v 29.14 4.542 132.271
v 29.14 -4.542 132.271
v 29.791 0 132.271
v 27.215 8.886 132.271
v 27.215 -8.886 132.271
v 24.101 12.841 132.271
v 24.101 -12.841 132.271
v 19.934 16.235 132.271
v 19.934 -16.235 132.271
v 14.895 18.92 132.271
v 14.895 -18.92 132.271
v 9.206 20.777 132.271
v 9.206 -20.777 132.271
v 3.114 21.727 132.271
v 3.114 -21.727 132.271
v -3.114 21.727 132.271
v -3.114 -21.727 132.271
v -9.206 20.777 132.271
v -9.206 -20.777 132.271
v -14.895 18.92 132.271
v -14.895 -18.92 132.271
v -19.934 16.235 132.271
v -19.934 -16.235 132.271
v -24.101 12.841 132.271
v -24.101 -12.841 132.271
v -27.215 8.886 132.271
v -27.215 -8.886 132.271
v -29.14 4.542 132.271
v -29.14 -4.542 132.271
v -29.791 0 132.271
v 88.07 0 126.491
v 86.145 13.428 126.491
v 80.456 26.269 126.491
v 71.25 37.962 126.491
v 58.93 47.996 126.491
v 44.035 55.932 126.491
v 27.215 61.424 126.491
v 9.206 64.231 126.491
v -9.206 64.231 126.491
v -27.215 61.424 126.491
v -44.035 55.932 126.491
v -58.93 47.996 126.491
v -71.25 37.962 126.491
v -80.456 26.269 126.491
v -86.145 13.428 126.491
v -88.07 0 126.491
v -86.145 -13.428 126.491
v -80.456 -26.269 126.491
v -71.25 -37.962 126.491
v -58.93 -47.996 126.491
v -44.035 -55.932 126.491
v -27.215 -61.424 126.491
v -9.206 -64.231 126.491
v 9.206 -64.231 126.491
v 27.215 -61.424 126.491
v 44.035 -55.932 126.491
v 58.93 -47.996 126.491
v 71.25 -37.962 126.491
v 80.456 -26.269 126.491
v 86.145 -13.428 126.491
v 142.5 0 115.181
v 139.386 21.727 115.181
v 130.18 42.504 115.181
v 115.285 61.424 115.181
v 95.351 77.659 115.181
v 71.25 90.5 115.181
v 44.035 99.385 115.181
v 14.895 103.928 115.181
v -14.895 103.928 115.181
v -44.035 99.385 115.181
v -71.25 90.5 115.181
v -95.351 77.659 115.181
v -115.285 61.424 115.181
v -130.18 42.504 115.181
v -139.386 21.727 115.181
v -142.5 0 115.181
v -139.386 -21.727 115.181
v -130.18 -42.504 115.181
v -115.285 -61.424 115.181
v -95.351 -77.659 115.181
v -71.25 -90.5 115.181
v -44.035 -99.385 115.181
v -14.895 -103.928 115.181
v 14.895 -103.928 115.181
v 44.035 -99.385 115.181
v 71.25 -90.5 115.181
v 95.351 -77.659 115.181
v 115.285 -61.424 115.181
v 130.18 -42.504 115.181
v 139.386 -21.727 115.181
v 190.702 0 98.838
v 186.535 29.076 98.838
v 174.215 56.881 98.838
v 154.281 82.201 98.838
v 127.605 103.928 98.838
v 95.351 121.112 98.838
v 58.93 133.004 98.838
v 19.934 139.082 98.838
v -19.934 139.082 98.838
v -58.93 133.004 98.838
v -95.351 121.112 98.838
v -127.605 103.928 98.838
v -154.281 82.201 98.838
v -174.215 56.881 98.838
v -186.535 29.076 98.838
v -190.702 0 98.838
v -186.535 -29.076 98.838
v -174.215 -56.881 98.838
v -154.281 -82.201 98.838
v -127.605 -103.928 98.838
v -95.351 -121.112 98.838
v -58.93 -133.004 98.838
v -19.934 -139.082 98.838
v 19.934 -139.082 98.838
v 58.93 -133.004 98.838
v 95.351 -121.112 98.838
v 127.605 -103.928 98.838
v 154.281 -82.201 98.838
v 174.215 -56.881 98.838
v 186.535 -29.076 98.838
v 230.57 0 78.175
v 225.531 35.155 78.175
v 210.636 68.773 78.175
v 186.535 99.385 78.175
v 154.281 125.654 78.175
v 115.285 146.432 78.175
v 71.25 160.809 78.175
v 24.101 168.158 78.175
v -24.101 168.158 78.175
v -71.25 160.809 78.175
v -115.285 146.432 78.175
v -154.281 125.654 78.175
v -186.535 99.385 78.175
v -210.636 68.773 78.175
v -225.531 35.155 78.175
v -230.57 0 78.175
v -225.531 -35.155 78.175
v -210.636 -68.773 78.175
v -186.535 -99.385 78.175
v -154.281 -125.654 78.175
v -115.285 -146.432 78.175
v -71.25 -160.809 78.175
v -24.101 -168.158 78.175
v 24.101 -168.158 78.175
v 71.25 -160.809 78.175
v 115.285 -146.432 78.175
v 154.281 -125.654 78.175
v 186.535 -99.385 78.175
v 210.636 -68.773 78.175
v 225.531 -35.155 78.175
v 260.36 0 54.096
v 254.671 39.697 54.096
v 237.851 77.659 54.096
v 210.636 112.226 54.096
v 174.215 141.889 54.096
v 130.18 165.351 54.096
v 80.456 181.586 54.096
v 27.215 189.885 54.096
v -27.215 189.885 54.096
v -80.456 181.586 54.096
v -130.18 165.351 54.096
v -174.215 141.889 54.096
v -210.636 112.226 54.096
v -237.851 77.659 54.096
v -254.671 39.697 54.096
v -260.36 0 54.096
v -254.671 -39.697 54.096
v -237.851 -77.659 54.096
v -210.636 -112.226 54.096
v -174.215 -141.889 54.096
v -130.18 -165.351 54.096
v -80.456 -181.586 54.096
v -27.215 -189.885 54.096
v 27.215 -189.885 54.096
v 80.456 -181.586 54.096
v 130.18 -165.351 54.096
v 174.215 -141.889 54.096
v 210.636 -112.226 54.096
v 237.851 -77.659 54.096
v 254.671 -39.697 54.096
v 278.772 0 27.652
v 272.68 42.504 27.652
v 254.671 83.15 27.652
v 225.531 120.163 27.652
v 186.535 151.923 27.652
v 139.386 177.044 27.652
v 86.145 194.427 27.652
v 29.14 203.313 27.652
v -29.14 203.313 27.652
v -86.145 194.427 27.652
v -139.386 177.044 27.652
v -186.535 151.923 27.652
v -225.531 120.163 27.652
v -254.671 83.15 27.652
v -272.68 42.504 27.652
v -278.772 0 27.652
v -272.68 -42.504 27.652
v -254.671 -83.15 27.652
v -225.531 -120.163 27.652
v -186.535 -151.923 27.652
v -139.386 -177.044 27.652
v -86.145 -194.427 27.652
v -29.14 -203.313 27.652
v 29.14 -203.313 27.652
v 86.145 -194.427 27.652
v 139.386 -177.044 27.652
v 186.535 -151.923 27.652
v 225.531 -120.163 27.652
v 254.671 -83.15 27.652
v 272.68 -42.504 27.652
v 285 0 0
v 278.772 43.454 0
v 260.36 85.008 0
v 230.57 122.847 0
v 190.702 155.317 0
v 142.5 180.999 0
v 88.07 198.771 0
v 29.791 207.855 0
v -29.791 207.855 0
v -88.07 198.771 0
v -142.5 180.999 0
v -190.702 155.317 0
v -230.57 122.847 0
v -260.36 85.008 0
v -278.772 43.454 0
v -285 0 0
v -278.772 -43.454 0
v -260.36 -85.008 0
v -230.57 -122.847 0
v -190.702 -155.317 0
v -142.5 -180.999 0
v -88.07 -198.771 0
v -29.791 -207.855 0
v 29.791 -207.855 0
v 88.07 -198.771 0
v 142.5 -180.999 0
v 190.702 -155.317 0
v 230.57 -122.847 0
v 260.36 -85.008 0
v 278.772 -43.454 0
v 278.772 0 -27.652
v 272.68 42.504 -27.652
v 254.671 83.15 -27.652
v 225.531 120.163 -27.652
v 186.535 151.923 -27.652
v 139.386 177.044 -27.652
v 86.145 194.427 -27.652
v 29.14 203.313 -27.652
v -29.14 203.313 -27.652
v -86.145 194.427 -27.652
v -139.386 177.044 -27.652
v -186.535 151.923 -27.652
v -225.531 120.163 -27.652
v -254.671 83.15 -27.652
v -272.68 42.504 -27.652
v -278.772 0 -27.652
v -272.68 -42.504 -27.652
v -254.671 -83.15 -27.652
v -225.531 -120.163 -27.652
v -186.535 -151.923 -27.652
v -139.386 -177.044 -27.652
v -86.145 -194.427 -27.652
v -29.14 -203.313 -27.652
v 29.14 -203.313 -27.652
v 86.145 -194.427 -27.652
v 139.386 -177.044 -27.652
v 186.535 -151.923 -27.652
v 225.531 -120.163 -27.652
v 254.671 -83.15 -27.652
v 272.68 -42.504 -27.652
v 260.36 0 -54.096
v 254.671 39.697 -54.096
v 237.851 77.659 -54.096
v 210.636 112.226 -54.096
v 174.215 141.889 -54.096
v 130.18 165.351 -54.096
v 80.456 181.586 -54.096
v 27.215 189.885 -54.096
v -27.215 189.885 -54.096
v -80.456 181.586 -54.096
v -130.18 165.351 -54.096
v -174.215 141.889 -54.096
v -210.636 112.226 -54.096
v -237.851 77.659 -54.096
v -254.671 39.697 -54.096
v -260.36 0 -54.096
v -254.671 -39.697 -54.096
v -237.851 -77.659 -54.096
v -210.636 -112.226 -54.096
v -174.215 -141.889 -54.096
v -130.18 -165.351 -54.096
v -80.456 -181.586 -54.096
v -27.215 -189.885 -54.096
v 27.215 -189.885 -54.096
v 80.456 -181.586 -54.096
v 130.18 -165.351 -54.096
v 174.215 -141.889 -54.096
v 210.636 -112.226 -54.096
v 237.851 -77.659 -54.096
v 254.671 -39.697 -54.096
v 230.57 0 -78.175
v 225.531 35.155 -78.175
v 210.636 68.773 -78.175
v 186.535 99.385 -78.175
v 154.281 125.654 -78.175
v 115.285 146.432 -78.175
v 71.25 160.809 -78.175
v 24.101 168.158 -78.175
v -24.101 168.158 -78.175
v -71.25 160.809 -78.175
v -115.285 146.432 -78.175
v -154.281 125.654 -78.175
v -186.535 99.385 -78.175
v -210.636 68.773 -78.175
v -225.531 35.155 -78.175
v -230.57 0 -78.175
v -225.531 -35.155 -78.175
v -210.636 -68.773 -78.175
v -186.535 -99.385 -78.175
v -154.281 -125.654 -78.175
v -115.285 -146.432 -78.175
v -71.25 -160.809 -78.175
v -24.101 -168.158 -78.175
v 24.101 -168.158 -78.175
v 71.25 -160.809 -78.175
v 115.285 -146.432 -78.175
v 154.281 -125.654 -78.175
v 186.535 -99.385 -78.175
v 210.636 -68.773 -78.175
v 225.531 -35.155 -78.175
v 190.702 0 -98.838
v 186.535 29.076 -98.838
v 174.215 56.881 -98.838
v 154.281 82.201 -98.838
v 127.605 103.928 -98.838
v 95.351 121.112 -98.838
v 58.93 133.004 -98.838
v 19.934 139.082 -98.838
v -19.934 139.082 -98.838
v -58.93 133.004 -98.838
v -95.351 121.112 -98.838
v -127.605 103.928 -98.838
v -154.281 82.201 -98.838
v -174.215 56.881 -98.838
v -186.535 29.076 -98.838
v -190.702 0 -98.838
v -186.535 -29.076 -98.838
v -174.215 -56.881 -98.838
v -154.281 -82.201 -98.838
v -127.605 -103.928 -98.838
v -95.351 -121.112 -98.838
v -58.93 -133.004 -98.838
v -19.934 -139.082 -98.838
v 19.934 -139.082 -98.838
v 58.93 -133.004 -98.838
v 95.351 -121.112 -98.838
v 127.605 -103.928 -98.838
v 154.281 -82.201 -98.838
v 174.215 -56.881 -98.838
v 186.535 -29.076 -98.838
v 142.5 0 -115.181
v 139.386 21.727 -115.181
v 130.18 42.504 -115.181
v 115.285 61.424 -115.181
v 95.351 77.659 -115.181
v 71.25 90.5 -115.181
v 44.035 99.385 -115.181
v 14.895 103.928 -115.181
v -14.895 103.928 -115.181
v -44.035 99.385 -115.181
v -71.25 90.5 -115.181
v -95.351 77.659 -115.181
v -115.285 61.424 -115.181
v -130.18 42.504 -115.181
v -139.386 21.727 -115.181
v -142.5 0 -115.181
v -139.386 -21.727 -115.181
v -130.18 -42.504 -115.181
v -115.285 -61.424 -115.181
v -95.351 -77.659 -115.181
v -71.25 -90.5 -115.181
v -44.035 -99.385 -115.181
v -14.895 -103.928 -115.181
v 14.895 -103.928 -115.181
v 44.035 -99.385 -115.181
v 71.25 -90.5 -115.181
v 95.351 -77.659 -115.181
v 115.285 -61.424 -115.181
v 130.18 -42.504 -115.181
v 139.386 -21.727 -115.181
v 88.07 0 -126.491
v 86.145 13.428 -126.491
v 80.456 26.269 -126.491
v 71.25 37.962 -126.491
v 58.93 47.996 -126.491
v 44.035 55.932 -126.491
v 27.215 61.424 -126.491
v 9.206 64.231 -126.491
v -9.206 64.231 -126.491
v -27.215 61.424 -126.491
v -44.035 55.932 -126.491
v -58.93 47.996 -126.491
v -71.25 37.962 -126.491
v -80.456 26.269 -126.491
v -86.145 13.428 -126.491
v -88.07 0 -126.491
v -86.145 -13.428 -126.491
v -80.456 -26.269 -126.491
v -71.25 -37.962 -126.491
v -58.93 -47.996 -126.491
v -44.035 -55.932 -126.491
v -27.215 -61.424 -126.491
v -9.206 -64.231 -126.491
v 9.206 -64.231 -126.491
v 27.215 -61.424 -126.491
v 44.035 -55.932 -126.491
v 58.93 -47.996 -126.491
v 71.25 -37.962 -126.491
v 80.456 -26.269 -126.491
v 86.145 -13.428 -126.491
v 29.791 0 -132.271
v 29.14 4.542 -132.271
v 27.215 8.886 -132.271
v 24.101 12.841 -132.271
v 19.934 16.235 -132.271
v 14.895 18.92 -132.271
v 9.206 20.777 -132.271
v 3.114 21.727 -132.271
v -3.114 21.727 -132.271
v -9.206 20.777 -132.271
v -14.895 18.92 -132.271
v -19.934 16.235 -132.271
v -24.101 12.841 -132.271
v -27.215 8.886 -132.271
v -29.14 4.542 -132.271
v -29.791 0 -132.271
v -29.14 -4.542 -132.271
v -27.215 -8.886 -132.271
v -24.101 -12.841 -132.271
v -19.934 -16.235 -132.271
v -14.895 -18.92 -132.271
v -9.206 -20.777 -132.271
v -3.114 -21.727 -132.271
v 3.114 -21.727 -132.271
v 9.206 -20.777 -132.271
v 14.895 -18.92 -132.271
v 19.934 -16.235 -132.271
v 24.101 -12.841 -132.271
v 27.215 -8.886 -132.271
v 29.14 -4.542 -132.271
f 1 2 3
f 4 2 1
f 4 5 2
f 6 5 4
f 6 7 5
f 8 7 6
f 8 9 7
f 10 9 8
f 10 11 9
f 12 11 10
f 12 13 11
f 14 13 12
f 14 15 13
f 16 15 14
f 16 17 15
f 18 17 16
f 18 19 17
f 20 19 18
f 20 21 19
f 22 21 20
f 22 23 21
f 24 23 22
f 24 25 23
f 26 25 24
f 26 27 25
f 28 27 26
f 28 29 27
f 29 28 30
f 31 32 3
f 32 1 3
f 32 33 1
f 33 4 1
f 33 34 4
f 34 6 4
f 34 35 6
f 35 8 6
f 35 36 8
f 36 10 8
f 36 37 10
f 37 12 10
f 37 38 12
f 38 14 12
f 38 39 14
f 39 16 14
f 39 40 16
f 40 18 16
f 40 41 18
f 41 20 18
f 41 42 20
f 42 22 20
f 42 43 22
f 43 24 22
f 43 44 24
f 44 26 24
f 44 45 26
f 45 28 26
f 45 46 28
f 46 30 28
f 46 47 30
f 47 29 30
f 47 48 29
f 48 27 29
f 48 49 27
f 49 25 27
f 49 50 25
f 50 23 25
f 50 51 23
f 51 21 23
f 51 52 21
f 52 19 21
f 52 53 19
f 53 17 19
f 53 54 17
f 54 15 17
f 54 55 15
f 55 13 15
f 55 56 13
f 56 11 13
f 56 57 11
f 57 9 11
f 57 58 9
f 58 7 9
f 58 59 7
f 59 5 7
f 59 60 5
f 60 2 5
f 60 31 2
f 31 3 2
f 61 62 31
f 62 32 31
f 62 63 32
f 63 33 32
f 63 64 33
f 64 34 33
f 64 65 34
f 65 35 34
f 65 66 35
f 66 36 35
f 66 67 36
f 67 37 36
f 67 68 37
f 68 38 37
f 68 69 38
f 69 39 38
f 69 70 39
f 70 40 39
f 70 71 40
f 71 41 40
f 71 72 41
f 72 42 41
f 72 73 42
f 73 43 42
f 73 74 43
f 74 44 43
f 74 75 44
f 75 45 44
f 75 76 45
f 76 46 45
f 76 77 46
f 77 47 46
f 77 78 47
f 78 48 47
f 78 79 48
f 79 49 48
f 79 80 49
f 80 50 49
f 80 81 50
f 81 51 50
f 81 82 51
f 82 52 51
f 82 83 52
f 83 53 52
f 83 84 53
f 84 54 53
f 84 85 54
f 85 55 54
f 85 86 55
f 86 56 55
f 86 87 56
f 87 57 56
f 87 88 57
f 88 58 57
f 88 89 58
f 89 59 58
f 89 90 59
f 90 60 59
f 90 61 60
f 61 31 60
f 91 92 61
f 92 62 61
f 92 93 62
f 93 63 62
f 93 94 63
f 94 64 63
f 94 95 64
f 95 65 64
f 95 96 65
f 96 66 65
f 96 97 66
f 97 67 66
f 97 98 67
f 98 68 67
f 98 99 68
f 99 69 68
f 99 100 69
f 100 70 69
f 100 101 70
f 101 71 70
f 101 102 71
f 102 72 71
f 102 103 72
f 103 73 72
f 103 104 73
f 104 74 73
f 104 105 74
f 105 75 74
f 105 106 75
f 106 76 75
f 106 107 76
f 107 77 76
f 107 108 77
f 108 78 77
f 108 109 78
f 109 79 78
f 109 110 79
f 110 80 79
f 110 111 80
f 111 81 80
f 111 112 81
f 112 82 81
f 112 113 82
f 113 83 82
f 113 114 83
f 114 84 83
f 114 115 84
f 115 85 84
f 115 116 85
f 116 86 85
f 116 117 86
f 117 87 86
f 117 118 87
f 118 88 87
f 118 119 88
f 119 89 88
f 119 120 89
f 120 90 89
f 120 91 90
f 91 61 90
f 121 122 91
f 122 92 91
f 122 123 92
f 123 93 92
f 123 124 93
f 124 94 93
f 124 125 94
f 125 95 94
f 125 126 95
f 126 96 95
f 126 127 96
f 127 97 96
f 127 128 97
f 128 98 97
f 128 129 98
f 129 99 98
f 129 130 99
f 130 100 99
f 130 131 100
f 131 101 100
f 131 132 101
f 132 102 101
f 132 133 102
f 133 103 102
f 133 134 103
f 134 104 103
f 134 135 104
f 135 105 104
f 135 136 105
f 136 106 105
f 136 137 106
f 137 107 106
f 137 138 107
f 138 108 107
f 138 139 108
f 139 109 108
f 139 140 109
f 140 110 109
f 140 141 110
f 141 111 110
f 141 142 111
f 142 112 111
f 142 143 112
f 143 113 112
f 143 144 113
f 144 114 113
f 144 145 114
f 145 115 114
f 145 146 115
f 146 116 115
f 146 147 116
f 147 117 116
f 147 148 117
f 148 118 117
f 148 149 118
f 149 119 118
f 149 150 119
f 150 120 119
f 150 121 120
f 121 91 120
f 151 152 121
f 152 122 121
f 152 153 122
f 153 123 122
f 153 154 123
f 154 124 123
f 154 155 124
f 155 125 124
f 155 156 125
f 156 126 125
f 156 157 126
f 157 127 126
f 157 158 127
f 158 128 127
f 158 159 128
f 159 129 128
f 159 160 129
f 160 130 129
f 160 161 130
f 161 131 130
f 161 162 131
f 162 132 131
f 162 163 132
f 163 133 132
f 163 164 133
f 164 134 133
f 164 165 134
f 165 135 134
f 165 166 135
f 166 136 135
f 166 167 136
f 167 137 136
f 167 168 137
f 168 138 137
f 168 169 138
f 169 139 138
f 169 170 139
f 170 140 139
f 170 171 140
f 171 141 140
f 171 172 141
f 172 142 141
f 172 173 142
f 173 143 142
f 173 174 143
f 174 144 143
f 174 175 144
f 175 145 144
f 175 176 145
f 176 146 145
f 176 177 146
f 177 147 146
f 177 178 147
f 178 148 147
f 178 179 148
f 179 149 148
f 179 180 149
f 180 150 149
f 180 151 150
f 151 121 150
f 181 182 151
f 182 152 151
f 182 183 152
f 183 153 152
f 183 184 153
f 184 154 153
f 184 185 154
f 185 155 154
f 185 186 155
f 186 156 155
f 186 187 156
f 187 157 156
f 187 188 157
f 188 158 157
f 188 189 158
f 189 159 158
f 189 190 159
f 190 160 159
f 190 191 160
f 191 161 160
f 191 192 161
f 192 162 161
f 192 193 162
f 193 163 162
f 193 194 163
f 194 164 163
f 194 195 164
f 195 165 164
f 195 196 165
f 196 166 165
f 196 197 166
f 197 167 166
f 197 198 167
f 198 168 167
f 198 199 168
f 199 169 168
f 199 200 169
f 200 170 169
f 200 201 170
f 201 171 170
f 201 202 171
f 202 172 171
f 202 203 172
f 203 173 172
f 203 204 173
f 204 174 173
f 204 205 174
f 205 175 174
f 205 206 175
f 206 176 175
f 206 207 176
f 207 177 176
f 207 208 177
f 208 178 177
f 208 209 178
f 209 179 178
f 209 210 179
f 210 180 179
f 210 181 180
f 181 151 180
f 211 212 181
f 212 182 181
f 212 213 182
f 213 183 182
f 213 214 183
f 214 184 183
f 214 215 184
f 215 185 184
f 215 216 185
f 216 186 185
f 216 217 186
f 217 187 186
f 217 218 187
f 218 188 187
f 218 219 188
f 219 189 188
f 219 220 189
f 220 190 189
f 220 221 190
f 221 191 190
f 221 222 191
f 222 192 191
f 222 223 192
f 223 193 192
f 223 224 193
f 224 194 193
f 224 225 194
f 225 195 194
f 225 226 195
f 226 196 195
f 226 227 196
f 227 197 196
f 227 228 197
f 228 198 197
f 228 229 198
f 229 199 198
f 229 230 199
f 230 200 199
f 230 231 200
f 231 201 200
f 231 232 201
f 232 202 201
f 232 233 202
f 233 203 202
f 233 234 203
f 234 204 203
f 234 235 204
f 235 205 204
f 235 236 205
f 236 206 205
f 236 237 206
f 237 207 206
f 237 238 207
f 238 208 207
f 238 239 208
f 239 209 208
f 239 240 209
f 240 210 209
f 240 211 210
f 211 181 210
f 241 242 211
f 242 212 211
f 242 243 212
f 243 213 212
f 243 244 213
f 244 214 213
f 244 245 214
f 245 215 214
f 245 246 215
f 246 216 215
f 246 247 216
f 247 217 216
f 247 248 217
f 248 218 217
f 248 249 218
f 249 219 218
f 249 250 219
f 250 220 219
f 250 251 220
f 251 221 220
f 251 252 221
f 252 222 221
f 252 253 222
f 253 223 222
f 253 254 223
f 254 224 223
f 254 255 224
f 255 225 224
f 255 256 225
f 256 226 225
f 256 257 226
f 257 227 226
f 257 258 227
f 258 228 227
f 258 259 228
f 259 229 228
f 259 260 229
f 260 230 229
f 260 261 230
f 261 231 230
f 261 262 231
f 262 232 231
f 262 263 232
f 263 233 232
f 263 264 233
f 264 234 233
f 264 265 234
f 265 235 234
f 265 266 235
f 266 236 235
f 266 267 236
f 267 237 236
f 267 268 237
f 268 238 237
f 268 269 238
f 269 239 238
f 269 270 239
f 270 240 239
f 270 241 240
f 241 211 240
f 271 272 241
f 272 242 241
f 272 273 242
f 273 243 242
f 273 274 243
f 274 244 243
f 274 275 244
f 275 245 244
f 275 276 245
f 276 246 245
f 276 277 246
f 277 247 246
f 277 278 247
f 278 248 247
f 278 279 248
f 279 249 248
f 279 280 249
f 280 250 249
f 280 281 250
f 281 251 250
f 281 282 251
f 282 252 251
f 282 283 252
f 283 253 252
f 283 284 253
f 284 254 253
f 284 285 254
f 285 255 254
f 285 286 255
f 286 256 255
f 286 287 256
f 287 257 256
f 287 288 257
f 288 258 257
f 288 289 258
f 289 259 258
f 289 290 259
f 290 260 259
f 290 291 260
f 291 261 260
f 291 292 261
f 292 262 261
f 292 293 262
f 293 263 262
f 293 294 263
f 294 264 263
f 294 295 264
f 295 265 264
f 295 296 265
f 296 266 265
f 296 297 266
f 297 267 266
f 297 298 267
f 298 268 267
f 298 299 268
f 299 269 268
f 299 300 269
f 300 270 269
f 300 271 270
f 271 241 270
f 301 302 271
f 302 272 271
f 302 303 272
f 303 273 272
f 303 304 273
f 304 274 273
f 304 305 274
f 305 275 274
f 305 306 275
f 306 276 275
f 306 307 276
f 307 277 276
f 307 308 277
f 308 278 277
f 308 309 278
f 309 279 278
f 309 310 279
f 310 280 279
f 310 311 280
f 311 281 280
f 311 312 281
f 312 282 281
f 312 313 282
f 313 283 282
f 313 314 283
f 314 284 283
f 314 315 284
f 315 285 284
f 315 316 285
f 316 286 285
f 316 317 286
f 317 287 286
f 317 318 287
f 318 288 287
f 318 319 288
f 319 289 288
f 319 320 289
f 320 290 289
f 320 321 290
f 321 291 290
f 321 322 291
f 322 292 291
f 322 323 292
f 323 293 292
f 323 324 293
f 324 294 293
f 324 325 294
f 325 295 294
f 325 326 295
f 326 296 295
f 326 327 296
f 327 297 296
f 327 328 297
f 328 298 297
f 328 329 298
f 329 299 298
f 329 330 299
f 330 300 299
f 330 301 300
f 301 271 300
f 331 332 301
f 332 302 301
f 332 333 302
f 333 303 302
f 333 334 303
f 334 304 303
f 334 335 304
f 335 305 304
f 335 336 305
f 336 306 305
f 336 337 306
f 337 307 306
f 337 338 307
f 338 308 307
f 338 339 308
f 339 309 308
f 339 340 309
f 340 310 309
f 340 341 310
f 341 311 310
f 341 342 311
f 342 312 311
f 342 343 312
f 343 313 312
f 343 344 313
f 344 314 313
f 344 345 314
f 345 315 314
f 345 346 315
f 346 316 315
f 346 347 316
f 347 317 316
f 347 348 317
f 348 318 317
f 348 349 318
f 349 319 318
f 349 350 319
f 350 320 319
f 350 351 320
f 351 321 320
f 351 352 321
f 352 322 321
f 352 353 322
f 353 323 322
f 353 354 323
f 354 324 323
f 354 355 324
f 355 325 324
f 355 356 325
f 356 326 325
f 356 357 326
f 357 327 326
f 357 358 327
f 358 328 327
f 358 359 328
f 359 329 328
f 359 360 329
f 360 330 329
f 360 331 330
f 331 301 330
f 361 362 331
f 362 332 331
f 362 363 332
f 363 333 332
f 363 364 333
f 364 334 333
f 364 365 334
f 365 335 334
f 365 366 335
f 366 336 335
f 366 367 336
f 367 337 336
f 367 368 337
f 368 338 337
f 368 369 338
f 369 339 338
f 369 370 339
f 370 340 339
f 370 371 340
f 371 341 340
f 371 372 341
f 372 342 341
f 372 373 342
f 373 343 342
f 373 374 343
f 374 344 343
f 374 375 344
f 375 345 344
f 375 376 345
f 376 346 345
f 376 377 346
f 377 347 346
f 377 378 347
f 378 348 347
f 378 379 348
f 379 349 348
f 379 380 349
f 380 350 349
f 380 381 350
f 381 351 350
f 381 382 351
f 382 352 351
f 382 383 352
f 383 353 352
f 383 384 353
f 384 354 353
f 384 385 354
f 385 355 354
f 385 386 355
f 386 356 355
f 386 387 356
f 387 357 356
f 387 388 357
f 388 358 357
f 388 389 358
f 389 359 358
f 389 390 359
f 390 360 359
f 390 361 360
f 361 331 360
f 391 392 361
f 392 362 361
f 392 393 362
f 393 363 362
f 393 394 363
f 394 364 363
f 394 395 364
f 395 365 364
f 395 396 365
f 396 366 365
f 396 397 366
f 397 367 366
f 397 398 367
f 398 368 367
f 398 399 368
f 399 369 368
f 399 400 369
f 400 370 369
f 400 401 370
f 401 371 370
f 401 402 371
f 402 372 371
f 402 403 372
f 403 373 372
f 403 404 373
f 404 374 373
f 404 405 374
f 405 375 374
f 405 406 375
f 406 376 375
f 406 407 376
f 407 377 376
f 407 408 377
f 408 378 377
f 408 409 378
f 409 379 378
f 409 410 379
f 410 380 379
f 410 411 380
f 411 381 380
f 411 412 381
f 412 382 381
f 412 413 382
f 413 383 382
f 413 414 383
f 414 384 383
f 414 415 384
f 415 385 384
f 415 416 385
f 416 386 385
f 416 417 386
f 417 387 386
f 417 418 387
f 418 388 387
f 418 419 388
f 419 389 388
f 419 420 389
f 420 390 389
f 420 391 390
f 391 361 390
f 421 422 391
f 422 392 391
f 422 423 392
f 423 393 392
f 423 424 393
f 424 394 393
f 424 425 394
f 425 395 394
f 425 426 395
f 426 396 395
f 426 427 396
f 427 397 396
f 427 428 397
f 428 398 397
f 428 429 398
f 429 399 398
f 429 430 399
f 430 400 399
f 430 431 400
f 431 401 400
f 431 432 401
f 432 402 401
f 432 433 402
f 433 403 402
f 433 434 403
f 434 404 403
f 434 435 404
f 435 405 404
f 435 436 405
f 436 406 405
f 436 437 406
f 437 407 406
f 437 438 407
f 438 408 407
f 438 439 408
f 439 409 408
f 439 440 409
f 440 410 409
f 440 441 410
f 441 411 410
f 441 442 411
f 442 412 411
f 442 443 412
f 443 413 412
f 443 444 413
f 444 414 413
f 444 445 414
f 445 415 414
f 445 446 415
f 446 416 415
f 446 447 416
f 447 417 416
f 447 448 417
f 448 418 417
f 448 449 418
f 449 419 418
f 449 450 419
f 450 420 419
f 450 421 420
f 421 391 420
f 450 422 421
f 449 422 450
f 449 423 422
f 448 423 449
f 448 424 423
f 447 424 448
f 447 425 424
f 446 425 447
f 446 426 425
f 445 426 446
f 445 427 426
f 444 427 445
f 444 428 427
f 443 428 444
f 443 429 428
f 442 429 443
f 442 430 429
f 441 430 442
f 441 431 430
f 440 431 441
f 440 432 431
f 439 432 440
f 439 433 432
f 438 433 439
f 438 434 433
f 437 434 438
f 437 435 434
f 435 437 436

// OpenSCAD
// Generated by SolidPython 1.0.1 on 2020-07-29 00:46:52


scale(v = [15, 11, 7]) {
	sphere(r = 19);
}
/***********************************************
*********      SolidPython code:      **********
************************************************
 
# import packages: SolidPython
from solid import *
from solid.utils import *
from itertools import chain, combinations, permutations


class Resize:

    def __init__(self, scad_file):
        self.scad_file = scad_file
        #self.scad_file = import_scad(scad_file)
        # cone/cylinder param:
        self.r1 = 0
        self.r2 = 0
        self.h = 0
        # rectangular prism param:
        self.w = 0
        self.l = 0
        # ellipse param:
        self.r = 0

    # import OpenScad code (file name corresponds to shape)


    # classify shape + parameters
    def assign(self, param1, param2, param3):
        if self.scad_file == 'cone.scad':
            self.r1 = param1
            self.r2 = param2
            self.h = param3
        elif self.scad_file == 'cylinder.scad':
            self.r1 = param1
            self.r2 = param2
            self.h = param3
        elif self.scad_file == 'rectangularPrism.scad':
            self.h = param1
            self.l = param2
            self.w = param3
        else:
            self.r = param1
            self.h = param2

    # resize parameters
    def iterate(self):
        x = range(3, 20, 2)
        i = 1
        if self.scad_file == 'cone.scad':
            tempList = list(permutations(x, 2))
            for temp in tempList:
                param1 = temp[0]
                param2 = temp[1]
                filepath = 'produced_scad_files/' + 'cone' + str(param1) + '_' + str(param2) + '_' + '.scad'
                scad_render_to_file(cylinder(h=param1, r1=param2, r2=0), filepath)

        elif self.scad_file == 'cylinder.scad':
            tempList = list(permutations(x, 3))
            for temp in tempList:
                param1 = temp[0]
                param2 = temp[1]
                filepath = 'produced_scad_files/' + 'cylinder' + str(param1) + '_' + str(param2) + '_' + '.scad'
                scad_render_to_file(cylinder(h=param1, r1=param2, r2=param2), filepath)

        elif self.scad_file == 'rectangularPrism.scad':
            tempList = list(permutations(x, 3))
            for temp in tempList:
                param1 = temp[0]
                param2 = temp[1]
                param3 = temp[2]
                filepath = 'produced_scad_files/' + 'rectangularPrism' + str(param1) + '_' + str(param2) + '_' + str(
                    param3) + '.scad'
                scad_render_to_file(cube(size=(param1, param2, param3)), filepath)

        elif self.scad_file == 'ellipse.scad':
            tempList = list(permutations(x, 4))
            for temp in tempList:
                param1 = temp[0]
                param2 = temp[1]
                param3 = temp[2]
                param4 = temp[3]
                filepath = 'produced_scad_files/' + 'ellipse' + str(param1) + '_' + str(param2) + '_' + str(param3) + '_' + str(param4) + '.scad'
                scad_render_to_file(scale([param1, param2, param3])(sphere(r=param4)), filepath)

    def render_to_scadfile(self):
        scad_render_to_file(scad, 'example.scad') 
 
************************************************/
